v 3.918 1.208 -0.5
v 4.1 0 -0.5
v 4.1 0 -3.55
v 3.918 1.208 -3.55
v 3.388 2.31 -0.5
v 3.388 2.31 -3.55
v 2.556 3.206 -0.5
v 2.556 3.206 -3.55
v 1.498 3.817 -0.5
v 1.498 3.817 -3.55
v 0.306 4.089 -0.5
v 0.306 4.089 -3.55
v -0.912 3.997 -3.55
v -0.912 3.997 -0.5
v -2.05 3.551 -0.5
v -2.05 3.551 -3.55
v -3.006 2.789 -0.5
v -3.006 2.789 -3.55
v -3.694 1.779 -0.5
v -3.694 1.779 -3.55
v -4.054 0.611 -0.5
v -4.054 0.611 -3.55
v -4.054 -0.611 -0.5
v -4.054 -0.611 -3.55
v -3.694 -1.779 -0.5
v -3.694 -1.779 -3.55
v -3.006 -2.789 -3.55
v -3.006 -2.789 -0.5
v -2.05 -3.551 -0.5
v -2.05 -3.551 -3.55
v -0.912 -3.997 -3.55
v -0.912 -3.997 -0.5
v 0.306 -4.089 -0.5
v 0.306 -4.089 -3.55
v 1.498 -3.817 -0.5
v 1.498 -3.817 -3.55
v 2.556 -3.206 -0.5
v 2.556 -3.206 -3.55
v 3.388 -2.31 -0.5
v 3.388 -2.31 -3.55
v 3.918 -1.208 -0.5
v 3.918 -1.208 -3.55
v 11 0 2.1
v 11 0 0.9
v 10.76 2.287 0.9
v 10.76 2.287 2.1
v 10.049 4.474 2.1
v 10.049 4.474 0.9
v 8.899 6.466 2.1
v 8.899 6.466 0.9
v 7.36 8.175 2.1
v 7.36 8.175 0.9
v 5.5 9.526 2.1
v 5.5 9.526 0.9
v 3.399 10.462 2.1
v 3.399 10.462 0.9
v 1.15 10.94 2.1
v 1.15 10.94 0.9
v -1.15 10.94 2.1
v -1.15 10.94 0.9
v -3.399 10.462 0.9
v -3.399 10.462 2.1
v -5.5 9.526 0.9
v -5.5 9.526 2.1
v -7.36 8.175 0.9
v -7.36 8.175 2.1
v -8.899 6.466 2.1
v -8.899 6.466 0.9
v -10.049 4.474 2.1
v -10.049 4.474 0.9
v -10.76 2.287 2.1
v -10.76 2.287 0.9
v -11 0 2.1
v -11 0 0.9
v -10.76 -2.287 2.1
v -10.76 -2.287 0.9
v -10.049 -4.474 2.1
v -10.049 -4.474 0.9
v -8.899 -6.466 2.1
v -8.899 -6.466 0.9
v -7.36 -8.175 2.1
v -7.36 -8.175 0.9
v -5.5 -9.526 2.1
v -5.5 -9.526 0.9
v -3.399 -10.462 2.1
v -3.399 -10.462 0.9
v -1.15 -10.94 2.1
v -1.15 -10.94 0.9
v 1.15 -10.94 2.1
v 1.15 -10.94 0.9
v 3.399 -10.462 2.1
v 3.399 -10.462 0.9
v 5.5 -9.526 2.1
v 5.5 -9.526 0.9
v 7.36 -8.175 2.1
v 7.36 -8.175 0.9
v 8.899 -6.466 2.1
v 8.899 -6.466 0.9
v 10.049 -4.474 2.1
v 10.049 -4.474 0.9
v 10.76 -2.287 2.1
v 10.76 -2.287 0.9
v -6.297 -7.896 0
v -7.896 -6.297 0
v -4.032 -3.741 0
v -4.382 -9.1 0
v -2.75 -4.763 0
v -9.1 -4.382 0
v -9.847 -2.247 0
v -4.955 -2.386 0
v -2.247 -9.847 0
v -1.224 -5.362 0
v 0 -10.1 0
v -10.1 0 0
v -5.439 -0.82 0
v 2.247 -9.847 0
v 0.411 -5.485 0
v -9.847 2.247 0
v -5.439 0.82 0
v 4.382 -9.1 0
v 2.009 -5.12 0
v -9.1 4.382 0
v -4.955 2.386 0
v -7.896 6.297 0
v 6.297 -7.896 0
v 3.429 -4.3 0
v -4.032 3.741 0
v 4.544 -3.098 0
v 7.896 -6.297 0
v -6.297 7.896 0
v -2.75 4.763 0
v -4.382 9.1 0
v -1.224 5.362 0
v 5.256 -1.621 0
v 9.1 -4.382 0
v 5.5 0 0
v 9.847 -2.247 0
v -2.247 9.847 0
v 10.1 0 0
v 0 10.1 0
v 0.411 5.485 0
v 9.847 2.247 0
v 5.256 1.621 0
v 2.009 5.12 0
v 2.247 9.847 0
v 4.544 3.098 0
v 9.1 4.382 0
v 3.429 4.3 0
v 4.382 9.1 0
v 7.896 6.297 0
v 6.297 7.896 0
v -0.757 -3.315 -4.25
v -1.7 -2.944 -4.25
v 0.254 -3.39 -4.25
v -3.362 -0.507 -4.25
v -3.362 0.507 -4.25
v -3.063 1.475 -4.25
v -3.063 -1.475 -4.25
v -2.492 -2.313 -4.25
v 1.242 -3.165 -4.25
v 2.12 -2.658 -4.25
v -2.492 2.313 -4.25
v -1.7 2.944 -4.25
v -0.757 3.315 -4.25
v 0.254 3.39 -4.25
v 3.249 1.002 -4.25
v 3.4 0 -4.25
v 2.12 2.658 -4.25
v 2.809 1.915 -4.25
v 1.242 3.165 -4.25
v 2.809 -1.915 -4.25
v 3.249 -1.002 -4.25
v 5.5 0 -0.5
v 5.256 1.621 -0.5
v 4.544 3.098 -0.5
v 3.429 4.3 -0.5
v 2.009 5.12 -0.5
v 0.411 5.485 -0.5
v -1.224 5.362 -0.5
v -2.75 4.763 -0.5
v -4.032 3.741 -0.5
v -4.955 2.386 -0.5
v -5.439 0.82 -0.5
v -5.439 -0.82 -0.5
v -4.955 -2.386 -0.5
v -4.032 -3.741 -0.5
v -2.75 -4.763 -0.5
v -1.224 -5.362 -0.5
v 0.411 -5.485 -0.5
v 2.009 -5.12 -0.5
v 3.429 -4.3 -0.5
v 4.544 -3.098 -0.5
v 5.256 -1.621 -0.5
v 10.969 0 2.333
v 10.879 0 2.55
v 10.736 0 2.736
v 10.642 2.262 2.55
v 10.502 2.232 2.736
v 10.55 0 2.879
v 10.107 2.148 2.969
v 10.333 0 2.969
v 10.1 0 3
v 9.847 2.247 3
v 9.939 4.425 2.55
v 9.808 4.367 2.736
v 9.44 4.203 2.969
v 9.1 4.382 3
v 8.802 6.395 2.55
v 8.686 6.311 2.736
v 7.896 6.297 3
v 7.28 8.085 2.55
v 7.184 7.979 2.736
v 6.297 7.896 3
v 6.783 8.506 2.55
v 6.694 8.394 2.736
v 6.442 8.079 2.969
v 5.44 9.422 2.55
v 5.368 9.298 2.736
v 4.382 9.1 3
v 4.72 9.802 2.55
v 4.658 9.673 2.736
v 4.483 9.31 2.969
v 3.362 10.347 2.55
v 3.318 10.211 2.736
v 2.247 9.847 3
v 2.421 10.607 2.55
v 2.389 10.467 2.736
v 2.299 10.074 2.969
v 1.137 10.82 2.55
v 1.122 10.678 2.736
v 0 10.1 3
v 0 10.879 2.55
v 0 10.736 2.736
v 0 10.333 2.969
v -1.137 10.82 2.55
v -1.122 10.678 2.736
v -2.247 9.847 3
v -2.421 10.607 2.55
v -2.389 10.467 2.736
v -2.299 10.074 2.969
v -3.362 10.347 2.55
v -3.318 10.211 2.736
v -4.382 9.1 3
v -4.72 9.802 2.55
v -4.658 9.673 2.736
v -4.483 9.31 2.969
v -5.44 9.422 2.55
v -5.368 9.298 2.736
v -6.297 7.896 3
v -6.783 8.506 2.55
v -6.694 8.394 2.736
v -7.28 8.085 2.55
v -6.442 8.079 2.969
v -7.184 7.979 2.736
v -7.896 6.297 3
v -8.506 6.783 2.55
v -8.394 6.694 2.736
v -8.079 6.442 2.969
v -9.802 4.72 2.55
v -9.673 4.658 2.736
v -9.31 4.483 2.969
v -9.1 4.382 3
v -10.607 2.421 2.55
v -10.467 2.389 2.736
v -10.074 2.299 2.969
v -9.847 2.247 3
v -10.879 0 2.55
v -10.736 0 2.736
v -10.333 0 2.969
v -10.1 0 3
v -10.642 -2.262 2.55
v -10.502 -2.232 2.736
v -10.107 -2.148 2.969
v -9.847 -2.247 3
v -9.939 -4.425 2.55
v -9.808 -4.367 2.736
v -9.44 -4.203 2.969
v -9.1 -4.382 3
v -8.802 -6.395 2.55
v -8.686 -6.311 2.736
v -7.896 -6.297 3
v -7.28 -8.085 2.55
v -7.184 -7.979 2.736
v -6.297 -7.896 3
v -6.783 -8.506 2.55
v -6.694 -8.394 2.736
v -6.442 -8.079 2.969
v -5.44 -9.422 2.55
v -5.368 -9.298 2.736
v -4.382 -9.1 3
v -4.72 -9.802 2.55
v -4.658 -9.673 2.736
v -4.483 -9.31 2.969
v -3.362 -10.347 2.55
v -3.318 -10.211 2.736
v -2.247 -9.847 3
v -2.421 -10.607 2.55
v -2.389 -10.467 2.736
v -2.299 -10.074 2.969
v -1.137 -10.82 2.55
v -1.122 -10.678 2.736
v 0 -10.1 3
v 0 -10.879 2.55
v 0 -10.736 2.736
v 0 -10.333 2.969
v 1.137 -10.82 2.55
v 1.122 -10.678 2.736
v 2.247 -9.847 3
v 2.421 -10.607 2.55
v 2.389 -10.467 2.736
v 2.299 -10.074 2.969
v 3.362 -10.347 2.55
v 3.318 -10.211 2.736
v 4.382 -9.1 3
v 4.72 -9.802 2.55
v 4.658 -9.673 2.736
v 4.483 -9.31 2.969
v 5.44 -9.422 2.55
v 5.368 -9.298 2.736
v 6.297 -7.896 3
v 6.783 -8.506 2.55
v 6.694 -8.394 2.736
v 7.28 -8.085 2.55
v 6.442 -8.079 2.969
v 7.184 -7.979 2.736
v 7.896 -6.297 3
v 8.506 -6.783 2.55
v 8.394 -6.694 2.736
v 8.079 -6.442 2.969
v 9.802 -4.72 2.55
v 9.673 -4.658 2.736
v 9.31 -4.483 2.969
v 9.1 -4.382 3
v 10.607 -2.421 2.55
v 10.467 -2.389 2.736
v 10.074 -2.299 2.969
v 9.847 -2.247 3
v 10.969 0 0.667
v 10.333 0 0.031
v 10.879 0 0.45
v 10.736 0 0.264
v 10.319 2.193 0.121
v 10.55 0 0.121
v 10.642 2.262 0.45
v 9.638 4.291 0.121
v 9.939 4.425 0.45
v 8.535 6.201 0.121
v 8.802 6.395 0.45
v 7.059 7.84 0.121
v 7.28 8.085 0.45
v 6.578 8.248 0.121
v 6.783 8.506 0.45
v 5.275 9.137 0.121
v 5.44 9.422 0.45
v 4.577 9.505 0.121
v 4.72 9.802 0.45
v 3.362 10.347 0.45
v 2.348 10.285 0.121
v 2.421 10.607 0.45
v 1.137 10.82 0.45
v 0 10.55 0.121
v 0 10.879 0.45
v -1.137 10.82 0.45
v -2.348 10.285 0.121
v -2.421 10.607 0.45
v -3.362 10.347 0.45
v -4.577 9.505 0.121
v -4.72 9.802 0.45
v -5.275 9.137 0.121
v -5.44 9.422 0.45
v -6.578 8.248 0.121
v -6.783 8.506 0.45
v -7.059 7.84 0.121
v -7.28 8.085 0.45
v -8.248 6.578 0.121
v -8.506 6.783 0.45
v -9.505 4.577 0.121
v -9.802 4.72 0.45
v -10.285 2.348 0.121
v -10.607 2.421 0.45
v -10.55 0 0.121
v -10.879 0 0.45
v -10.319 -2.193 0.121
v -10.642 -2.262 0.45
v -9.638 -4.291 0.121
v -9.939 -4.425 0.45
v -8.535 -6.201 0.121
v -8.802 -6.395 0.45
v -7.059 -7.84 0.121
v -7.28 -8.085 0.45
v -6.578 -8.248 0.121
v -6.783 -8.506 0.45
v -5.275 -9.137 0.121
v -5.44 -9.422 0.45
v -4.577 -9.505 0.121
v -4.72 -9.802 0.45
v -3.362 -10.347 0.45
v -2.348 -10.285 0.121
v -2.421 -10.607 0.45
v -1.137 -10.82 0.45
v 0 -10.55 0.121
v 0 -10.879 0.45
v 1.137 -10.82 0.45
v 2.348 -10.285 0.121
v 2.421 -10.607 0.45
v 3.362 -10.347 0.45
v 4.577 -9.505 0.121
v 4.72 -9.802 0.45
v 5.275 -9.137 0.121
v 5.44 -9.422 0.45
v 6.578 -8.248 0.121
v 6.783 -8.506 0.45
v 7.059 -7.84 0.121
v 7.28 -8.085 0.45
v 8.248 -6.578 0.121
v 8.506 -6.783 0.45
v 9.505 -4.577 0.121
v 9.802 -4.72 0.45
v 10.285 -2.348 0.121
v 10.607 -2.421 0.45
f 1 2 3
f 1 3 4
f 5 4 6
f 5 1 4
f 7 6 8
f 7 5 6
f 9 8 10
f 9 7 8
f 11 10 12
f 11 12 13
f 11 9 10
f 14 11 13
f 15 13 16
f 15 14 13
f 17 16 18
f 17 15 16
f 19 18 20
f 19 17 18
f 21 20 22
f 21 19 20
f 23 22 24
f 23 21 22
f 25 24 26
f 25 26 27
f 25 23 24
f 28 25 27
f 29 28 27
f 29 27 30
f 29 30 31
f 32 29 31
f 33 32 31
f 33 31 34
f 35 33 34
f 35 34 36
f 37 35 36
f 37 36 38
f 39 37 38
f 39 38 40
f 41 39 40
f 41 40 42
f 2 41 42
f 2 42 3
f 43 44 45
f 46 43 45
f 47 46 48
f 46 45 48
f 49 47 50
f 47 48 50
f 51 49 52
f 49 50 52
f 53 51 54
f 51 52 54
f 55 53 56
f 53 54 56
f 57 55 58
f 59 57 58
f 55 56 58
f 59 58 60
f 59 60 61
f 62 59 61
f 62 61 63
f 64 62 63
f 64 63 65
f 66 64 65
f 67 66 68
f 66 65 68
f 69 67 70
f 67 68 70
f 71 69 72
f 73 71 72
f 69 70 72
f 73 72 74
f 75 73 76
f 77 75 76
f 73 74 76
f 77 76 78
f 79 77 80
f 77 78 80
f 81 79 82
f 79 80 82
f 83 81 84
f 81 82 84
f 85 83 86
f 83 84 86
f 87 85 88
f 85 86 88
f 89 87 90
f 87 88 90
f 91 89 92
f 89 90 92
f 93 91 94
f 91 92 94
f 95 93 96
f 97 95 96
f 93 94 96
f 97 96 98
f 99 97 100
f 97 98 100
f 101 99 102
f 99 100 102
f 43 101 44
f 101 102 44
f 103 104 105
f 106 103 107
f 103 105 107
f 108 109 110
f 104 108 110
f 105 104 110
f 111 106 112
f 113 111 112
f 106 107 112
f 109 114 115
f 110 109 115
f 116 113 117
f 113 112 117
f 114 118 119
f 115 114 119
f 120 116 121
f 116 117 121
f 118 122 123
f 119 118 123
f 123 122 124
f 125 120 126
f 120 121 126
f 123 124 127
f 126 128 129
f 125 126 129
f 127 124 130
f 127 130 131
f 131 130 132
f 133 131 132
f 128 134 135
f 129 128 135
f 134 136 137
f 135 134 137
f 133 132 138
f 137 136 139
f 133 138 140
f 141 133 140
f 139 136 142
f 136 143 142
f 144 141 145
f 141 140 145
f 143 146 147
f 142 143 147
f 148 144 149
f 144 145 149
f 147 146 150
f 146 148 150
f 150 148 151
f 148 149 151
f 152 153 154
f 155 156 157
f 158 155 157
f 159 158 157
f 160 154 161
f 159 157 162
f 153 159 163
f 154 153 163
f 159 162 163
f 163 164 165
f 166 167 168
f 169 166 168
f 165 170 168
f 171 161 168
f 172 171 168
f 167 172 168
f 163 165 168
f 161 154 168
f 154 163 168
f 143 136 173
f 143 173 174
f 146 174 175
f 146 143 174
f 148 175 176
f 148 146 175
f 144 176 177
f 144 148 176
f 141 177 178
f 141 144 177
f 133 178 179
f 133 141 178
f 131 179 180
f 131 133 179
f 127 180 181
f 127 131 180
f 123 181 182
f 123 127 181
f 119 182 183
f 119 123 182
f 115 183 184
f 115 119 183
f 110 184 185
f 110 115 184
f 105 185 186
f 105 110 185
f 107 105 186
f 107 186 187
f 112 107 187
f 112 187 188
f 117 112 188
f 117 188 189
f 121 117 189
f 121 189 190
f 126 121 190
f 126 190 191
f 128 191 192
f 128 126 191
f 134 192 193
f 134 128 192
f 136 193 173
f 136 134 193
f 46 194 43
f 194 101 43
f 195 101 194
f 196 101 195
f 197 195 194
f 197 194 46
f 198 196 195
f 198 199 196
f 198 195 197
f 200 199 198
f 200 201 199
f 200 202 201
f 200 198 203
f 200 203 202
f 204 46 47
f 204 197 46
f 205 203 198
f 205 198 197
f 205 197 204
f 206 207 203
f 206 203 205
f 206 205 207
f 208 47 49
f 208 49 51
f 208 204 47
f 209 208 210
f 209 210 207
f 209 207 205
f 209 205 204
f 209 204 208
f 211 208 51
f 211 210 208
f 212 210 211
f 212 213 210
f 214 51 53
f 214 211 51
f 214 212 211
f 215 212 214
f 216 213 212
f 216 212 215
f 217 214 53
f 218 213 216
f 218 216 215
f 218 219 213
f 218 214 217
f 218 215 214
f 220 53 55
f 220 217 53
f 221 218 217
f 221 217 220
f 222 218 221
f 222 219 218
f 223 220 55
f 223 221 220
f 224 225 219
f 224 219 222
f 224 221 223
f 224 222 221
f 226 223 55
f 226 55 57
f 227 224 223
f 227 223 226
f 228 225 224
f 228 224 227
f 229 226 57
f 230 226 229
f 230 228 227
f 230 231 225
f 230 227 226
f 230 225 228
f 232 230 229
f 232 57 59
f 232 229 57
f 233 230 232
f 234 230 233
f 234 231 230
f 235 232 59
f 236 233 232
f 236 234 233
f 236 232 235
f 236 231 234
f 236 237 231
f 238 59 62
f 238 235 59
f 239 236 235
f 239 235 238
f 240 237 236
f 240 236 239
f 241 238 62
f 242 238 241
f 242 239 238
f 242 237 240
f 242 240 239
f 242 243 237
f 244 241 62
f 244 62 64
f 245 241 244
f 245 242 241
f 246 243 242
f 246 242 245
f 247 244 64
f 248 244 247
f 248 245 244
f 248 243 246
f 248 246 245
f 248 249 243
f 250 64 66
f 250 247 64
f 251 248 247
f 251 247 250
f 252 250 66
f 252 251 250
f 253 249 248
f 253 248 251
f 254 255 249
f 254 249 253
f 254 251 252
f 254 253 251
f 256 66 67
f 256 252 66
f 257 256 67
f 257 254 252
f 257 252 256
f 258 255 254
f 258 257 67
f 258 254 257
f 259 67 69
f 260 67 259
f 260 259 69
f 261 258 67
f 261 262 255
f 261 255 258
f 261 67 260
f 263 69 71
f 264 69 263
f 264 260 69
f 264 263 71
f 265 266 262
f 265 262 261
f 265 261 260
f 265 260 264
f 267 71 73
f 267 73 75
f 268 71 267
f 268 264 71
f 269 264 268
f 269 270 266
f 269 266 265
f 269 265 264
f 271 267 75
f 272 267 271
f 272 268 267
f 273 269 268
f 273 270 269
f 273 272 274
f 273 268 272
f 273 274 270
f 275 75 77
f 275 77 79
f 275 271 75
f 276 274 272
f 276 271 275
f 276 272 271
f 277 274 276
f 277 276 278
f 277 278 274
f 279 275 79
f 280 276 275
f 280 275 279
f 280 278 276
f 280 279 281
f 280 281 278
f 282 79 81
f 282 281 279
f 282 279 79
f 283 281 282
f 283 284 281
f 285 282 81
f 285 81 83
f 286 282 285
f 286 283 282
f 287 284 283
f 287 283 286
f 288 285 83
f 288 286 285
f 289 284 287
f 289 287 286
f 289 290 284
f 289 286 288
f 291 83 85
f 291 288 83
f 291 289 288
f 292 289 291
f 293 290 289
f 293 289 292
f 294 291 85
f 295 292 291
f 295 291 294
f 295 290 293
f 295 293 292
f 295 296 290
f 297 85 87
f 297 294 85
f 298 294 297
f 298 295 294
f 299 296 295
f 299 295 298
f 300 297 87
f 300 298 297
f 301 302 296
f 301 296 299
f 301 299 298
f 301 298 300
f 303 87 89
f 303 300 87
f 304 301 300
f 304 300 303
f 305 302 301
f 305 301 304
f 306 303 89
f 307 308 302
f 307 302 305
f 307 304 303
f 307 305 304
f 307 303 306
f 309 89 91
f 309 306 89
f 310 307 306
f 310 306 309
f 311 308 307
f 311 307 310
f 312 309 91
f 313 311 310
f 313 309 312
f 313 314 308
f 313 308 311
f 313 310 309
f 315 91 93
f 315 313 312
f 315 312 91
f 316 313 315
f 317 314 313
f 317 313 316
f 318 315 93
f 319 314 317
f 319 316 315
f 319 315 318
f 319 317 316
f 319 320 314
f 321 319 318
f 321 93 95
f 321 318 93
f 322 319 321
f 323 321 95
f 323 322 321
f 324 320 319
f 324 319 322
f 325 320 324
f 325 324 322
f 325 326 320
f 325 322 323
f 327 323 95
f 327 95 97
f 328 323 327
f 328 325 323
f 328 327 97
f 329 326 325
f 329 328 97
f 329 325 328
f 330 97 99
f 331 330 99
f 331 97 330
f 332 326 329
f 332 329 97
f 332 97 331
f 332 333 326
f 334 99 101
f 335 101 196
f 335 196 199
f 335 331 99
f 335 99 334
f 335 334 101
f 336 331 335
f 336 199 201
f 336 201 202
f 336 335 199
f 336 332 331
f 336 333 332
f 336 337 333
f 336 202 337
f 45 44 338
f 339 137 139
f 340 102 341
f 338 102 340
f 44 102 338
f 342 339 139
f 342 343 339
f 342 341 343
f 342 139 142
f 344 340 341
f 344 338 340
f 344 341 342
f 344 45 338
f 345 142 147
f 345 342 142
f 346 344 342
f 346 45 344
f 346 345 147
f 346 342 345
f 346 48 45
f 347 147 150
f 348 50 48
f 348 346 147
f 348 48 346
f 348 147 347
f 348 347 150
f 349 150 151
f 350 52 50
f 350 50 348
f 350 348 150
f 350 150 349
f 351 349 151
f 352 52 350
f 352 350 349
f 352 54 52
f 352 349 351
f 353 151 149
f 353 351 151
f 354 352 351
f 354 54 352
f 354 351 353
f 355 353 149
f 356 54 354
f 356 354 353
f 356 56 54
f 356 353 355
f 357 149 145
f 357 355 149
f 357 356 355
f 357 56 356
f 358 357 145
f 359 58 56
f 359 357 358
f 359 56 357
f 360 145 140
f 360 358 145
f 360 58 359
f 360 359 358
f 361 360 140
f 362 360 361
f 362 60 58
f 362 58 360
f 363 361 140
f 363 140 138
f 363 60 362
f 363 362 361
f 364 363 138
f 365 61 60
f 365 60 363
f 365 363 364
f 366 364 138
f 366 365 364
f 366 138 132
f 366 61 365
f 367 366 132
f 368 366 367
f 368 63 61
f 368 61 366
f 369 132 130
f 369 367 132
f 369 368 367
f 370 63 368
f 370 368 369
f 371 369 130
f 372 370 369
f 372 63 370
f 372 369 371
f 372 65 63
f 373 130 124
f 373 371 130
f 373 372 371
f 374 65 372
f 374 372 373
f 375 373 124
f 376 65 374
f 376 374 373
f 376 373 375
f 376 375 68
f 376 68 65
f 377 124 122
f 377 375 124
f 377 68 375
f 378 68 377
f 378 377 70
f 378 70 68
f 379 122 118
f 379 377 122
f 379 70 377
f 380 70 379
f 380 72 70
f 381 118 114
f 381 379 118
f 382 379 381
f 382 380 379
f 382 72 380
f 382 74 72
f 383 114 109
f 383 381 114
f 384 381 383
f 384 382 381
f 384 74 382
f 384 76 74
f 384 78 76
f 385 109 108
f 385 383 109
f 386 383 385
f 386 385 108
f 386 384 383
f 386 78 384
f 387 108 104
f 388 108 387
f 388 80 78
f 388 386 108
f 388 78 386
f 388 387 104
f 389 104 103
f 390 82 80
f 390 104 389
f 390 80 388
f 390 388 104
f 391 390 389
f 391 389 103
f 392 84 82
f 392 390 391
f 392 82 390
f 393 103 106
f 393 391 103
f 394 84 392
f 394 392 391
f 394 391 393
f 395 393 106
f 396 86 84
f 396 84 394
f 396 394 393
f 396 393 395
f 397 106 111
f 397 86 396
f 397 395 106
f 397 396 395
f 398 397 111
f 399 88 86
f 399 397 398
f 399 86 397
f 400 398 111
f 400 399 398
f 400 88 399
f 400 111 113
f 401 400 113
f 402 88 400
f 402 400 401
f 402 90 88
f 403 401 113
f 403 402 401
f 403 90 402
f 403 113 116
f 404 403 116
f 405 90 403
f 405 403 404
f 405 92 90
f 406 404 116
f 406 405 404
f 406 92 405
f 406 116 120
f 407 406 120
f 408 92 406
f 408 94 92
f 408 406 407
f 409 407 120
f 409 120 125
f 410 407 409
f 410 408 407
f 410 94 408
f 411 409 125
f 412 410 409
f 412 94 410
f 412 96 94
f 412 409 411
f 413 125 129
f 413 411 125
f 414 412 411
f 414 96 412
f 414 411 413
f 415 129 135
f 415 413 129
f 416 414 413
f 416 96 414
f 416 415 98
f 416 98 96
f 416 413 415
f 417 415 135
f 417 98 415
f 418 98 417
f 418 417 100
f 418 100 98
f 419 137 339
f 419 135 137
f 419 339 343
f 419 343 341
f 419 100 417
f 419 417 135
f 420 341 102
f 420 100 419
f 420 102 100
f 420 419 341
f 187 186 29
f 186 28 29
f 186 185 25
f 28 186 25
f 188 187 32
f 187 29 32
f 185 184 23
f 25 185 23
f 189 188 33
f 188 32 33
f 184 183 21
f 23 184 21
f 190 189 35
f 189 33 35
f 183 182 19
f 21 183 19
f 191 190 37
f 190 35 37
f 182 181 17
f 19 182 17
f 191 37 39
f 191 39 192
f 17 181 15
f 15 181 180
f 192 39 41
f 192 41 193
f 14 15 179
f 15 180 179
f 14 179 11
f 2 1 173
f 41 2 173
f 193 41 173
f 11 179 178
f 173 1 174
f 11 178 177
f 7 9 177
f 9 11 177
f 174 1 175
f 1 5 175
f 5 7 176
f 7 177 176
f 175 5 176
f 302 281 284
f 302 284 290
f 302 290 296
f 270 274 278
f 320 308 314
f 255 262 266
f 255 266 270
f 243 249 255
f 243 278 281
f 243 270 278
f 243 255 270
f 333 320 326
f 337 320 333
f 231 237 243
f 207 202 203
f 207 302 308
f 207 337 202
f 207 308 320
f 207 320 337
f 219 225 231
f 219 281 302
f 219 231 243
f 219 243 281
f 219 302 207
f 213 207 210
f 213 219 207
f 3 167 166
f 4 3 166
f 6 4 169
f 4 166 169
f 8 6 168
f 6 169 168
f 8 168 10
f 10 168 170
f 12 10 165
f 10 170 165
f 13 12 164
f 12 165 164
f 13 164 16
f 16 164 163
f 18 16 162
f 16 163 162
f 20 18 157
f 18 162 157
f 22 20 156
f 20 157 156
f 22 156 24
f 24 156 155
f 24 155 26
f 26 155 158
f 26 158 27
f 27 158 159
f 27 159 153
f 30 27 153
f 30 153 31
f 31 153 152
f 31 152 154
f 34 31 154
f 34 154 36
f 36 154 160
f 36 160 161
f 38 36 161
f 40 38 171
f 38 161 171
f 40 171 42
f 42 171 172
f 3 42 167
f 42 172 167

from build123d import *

# Parameters (mm, degrees)
F0_R     = 11
F0_R_2   = 5.5
F0_R_3   = 4.1
F1_DEPTH = 3
F2_DEPTH = 4.25
F3_SIZE  = 0.7
F4_R     = 0.9
F5_DEPTH = 0.5


with BuildPart() as f1:
    # F0 (on Top) → F1 (new body)
    with BuildSketch(Plane.XY):
        Circle(F0_R)
        Circle(F0_R_2, mode=Mode.SUBTRACT)
        Circle(F0_R_2)
        Circle(F0_R_3, mode=Mode.SUBTRACT)
        Circle(F0_R_3)
    extrude(amount=F1_DEPTH)

    # F0 (on Top) → F2 (join)
    with BuildSketch(Plane.XY):
        Circle(F0_R_3)
    extrude(amount=-F2_DEPTH)

    # F3
    f3_edges = [f1.edges().sort_by_distance(p)[0] for p in [
        (-4.1, 0, -4.25),
    ]]
    chamfer(f3_edges, length=F3_SIZE)

    # F4
    f4_edges = [f1.edges().sort_by_distance(p)[0] for p in [
        (11, 0, 1.5),
        (-11, 0, 0),
        (-11, 0, 3),
    ]]
    fillet(f4_edges, radius=F4_R)

    # F0 (on Top) → F5 (join)
    with BuildSketch(Plane.XY):
        Circle(F0_R_2)
        Circle(F0_R_3, mode=Mode.SUBTRACT)
    extrude(amount=-F5_DEPTH)


solid = f1.part
